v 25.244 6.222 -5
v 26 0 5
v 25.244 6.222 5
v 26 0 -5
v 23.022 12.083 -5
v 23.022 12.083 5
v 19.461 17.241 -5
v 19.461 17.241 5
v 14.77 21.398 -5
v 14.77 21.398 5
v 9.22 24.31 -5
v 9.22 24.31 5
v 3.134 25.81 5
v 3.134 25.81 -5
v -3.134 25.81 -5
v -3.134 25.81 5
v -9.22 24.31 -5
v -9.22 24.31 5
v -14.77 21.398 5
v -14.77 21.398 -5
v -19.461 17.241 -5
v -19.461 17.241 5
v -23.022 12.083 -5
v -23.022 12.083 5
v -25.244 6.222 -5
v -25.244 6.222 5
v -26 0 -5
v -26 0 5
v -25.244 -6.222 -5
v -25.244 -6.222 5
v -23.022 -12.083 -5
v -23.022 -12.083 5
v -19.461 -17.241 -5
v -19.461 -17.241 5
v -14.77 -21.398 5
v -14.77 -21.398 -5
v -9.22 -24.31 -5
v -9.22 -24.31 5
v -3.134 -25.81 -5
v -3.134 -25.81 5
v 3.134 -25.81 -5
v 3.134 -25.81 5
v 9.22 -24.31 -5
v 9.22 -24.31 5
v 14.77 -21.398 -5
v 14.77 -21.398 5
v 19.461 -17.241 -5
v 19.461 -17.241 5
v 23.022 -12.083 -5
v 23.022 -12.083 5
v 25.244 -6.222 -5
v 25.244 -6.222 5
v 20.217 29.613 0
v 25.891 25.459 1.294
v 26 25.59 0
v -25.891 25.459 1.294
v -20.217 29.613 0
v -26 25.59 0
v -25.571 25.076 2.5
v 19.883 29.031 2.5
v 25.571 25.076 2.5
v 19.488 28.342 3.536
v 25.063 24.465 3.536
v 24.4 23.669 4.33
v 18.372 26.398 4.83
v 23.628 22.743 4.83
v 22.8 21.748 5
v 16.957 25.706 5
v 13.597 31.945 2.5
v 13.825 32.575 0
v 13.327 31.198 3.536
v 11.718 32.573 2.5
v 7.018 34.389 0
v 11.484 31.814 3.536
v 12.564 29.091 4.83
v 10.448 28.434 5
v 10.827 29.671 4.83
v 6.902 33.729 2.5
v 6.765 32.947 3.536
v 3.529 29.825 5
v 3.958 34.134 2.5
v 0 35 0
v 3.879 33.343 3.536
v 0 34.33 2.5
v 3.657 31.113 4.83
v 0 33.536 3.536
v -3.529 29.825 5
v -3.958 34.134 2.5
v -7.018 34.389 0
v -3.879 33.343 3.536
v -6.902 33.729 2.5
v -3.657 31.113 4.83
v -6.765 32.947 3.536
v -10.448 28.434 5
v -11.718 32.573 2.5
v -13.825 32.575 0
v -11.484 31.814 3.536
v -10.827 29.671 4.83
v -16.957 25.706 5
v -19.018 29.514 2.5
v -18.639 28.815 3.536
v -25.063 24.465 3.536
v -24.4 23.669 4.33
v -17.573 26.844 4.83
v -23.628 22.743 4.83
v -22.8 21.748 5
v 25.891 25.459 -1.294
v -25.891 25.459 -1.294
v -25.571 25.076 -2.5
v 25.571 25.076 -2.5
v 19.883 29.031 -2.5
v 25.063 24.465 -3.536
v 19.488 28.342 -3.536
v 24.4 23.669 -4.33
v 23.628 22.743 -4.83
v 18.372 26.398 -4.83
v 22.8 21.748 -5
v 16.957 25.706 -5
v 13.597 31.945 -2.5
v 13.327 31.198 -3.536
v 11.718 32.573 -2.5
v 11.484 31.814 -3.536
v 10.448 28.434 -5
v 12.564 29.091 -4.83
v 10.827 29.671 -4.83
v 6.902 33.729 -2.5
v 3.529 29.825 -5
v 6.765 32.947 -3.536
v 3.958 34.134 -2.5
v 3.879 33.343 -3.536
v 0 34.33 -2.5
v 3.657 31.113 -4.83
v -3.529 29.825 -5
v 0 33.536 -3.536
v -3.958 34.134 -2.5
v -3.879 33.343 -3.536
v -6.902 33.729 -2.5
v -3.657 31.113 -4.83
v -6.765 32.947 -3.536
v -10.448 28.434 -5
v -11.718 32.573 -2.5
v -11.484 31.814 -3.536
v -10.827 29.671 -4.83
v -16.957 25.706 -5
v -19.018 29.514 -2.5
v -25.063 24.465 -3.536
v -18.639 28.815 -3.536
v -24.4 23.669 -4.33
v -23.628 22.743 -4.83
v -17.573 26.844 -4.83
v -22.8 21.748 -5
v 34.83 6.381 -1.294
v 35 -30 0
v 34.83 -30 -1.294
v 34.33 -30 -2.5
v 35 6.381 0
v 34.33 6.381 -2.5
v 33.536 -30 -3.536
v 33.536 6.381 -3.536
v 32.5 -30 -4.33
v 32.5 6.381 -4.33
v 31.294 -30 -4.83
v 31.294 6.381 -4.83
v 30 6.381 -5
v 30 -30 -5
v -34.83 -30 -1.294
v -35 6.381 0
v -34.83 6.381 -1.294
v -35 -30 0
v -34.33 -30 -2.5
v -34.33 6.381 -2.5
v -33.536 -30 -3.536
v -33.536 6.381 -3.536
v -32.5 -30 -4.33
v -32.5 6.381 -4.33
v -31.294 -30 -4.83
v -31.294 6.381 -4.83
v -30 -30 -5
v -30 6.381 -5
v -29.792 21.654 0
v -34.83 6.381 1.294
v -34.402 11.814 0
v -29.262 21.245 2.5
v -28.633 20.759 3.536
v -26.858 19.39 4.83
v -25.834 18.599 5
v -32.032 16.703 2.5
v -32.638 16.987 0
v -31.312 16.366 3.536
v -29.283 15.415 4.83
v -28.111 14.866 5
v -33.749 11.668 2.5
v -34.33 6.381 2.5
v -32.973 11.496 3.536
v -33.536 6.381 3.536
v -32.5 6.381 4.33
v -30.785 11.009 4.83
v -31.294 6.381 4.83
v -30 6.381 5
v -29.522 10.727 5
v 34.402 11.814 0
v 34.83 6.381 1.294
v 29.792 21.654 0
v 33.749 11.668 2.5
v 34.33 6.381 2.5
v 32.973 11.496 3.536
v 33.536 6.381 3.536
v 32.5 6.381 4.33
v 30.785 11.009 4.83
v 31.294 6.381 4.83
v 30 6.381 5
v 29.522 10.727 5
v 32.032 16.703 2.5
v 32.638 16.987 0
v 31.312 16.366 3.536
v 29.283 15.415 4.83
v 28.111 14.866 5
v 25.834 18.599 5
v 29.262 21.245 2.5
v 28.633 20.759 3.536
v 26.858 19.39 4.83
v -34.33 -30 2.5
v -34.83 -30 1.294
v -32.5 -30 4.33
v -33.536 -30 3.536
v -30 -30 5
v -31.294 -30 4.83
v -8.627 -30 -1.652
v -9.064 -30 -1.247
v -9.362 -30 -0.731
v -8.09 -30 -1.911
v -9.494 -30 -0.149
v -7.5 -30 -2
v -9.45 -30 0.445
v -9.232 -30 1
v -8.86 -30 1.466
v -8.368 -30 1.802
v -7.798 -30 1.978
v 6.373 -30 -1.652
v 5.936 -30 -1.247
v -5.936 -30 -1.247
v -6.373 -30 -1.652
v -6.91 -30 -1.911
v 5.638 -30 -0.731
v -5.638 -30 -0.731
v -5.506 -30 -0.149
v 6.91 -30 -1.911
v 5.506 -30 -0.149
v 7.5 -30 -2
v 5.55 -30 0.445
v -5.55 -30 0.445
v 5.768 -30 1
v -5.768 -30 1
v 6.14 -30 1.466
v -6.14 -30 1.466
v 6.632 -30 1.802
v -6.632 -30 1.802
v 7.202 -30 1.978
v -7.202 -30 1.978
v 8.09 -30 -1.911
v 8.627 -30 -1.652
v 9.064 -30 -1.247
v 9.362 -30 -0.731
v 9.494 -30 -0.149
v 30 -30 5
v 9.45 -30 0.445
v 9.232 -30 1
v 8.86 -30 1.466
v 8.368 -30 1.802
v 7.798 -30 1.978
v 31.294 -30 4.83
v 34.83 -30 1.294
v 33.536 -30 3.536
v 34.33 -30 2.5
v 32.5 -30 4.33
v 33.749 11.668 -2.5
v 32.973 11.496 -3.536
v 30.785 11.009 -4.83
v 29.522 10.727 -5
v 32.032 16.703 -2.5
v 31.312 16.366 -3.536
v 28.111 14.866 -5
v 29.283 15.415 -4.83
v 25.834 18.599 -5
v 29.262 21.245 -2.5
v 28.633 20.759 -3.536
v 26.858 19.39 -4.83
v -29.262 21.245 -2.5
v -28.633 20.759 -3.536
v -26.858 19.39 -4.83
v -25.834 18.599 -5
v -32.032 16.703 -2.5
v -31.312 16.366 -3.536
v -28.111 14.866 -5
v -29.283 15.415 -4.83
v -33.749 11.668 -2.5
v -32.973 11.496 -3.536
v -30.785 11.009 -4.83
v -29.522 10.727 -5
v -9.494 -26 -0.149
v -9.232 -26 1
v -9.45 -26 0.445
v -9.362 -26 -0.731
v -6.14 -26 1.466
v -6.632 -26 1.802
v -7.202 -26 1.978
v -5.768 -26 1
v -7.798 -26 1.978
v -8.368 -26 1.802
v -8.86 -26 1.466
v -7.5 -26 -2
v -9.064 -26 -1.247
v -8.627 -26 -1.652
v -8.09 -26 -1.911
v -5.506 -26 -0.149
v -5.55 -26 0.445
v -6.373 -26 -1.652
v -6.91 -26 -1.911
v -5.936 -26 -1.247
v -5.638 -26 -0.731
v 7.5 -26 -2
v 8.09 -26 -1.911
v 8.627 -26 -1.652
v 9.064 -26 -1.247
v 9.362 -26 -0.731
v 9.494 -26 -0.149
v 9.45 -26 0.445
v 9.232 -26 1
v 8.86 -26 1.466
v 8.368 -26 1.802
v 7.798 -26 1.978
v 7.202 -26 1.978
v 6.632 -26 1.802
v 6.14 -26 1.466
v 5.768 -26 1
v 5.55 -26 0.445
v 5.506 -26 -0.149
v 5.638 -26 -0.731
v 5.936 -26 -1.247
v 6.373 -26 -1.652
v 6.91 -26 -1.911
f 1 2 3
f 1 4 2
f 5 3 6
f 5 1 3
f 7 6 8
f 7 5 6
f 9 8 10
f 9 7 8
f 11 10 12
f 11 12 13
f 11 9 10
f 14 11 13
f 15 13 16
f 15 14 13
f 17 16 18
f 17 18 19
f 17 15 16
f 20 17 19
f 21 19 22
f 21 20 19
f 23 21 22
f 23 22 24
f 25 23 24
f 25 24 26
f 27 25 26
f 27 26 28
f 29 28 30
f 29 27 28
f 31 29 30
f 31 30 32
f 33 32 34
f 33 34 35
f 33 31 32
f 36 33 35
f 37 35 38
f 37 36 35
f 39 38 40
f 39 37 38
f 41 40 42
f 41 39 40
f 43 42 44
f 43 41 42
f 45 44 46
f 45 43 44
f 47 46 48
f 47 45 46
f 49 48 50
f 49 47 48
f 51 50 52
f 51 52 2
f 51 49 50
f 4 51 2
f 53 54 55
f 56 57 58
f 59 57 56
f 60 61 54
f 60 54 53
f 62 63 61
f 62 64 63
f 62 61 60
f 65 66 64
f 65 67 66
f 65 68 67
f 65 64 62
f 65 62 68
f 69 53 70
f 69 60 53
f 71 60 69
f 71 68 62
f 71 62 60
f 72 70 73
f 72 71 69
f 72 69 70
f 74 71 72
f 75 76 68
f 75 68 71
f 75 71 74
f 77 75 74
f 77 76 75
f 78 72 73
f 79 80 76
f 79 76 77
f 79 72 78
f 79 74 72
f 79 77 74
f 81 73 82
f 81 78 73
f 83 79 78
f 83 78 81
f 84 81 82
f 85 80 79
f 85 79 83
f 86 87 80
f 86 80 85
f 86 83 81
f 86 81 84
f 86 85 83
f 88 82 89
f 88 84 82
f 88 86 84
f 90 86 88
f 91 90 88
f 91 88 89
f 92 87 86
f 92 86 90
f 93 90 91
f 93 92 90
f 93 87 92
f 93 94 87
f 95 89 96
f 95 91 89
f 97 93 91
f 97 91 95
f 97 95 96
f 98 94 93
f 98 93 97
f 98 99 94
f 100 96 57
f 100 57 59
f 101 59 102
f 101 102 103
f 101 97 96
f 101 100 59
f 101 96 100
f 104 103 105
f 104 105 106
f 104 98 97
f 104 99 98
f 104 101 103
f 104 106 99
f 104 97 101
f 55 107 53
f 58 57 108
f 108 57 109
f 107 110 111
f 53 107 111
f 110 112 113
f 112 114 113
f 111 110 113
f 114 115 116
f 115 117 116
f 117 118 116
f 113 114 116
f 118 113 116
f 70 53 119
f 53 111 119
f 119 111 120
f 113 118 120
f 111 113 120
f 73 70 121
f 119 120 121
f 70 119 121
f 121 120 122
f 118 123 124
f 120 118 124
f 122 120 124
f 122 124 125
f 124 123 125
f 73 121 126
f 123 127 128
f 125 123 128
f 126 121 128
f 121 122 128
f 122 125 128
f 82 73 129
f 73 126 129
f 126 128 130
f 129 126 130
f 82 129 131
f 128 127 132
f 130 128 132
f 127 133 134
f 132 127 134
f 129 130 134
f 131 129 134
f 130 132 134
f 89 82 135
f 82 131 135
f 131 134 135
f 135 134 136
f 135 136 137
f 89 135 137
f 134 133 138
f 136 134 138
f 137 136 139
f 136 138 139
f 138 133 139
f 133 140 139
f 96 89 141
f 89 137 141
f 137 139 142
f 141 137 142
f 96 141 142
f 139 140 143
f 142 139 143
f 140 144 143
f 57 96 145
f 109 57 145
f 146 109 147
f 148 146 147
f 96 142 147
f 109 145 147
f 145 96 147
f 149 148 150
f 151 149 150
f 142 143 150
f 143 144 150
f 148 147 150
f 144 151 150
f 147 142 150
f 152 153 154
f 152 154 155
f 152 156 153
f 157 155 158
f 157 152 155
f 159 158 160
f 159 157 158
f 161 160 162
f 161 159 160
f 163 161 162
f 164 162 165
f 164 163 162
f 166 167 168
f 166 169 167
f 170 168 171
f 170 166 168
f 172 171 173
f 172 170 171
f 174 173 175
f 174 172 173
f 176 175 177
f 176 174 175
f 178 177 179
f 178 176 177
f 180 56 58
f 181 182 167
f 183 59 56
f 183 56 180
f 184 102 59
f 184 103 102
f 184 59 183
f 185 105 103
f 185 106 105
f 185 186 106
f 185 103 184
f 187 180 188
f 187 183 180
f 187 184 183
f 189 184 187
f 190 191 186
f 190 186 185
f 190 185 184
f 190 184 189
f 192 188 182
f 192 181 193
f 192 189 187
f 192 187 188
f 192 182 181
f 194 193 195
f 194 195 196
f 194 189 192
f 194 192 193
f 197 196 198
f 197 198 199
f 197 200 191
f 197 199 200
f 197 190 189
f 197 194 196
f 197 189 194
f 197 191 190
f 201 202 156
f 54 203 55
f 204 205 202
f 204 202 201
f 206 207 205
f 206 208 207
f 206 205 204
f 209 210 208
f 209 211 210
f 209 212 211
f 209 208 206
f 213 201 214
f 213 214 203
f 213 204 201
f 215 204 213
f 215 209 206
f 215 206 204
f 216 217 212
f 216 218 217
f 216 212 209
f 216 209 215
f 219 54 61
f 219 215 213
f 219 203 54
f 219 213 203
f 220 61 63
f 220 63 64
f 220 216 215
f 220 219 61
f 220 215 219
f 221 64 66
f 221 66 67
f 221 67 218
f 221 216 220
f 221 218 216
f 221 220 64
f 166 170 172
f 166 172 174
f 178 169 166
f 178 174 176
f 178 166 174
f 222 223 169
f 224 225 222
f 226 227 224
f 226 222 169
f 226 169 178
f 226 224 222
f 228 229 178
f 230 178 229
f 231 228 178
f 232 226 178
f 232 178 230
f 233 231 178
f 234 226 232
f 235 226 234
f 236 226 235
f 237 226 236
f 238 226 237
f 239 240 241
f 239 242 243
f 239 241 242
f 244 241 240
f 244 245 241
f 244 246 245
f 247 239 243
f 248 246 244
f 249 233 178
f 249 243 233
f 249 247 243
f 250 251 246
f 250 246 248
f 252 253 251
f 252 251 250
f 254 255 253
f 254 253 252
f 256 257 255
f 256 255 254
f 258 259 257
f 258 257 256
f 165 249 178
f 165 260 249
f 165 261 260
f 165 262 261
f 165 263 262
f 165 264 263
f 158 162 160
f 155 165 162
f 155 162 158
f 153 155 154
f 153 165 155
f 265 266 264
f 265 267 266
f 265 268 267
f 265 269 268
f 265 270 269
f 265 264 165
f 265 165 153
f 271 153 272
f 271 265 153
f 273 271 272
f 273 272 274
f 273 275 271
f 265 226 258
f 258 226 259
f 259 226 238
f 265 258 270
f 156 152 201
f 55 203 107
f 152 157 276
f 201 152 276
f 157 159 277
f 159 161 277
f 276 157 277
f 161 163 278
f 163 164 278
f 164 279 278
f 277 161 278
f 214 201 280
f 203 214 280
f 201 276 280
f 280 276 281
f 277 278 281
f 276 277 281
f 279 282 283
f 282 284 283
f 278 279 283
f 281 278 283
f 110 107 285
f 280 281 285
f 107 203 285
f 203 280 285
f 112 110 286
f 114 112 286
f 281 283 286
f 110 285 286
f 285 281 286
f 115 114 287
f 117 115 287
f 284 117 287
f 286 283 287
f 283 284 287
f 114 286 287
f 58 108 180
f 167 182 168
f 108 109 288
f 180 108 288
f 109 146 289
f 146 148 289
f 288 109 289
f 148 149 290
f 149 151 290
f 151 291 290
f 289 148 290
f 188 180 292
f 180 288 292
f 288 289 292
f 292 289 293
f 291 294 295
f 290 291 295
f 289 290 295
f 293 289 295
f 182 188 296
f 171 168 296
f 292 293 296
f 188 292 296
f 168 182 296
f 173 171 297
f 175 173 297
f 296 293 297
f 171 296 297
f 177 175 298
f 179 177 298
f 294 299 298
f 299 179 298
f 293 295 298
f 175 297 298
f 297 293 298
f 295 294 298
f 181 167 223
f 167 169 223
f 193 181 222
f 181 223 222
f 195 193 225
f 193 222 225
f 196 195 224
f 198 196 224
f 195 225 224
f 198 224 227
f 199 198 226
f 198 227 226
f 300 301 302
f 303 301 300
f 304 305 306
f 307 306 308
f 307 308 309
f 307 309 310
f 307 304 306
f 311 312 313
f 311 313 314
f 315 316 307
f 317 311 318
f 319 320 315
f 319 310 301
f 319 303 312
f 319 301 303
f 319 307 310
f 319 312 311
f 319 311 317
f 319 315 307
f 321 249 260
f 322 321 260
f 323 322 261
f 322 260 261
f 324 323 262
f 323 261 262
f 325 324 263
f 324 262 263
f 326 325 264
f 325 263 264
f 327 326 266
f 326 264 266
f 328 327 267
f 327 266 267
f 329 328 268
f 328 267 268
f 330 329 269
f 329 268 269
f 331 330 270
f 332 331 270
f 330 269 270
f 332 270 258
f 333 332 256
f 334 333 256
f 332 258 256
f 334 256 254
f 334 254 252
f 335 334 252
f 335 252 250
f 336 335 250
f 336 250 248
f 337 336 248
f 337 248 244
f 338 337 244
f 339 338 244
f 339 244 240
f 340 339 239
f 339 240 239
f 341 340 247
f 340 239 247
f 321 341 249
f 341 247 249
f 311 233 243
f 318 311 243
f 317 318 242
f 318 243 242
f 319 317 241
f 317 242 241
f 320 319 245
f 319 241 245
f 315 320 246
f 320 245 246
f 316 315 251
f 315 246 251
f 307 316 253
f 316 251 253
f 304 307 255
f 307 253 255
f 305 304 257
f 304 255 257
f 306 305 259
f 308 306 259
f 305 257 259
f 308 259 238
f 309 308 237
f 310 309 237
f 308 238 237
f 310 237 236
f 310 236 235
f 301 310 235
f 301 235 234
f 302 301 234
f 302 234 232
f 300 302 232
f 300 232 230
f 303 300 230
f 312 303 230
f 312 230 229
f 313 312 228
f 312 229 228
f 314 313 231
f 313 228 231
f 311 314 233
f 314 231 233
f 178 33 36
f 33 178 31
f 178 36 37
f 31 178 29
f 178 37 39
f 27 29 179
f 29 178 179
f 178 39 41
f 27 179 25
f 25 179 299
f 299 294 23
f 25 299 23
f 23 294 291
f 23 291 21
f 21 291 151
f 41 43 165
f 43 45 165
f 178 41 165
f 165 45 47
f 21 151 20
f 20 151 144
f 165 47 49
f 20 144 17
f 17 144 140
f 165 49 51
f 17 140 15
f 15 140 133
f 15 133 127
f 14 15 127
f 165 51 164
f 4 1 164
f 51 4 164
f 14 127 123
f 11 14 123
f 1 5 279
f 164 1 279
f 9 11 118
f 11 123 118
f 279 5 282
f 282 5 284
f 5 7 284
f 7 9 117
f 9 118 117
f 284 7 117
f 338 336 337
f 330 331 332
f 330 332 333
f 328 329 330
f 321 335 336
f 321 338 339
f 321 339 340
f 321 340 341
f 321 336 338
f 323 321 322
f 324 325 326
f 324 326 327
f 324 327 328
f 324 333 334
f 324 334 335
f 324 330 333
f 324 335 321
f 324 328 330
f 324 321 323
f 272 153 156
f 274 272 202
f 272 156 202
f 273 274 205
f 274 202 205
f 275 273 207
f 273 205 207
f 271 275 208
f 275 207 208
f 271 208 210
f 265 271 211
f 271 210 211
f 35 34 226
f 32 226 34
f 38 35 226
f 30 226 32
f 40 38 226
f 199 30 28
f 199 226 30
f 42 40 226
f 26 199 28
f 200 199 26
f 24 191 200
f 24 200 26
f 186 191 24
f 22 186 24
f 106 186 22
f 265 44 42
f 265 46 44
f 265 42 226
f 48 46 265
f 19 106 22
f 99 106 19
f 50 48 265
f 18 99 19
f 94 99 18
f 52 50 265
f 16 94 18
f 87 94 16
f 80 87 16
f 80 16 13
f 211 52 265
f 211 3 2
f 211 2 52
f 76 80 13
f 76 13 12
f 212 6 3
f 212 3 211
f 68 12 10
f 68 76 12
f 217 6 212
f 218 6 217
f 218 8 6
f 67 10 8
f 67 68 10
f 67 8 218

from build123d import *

# Parameters (mm, degrees)
SKETCH2_R           = 26
BOSS_EXTRUDE1_DEPTH = 5
FILLET3_R           = 25
SKETCH9_R           = 2
CUT_EXTRUDE2_DEPTH  = 4
FILLET5_R           = 5


with BuildPart() as part:
    # Sketch2 → Boss-Extrude1 (new, symmetric)
    with BuildSketch(Plane.XY):
        with BuildLine():
            Line((-35, 15), (-35, -30))
            Line((-35, -30), (35, -30))
            Line((35, -30), (35, 15))
            ThreePointArc((35, 15), (0, 35), (-35, 15))
        make_face()
        Circle(SKETCH2_R, mode=Mode.SUBTRACT)
    extrude(amount=BOSS_EXTRUDE1_DEPTH, both=True)

    # Fillet3
    fillet3_edges = [part.edges().sort_by_distance(p)[0] for p in [
        (35, 15, 0),
        (-35, 15, 0),
    ]]
    fillet(fillet3_edges, radius=FILLET3_R)

    # Sketch9 → Cut-Extrude2 (cut)
    with BuildSketch(Plane.XZ.offset(30)):
        with Locations(Location((-7.5, 0, 0), (0, 0, 270))):
            Circle(SKETCH9_R)
        with Locations(Location((7.5, 0, 0), (0, 0, 270))):
            Circle(SKETCH9_R)
    extrude(amount=-CUT_EXTRUDE2_DEPTH, mode=Mode.SUBTRACT)

    # Fillet5
    fillet5_edges = [part.edges().sort_by_distance(p)[0] for p in [
        (-35, -11.809571027, 5),
        (-35, -11.809571027, -5),
        (-32.638462845, 16.987459663, 5),
        (-32.638462845, 16.987459663, -5),
        (35, -11.809571027, -5),
        (35, -11.809571027, 5),
        (32.638462845, 16.987459663, 5),
        (32.638462845, 16.987459663, -5),
        (0, 35, 5),
        (0, 35, -5),
    ]]
    fillet(fillet5_edges, radius=FILLET5_R - 0.0001)  # a hair under: the kernel refuses the full size


solid = part.part
